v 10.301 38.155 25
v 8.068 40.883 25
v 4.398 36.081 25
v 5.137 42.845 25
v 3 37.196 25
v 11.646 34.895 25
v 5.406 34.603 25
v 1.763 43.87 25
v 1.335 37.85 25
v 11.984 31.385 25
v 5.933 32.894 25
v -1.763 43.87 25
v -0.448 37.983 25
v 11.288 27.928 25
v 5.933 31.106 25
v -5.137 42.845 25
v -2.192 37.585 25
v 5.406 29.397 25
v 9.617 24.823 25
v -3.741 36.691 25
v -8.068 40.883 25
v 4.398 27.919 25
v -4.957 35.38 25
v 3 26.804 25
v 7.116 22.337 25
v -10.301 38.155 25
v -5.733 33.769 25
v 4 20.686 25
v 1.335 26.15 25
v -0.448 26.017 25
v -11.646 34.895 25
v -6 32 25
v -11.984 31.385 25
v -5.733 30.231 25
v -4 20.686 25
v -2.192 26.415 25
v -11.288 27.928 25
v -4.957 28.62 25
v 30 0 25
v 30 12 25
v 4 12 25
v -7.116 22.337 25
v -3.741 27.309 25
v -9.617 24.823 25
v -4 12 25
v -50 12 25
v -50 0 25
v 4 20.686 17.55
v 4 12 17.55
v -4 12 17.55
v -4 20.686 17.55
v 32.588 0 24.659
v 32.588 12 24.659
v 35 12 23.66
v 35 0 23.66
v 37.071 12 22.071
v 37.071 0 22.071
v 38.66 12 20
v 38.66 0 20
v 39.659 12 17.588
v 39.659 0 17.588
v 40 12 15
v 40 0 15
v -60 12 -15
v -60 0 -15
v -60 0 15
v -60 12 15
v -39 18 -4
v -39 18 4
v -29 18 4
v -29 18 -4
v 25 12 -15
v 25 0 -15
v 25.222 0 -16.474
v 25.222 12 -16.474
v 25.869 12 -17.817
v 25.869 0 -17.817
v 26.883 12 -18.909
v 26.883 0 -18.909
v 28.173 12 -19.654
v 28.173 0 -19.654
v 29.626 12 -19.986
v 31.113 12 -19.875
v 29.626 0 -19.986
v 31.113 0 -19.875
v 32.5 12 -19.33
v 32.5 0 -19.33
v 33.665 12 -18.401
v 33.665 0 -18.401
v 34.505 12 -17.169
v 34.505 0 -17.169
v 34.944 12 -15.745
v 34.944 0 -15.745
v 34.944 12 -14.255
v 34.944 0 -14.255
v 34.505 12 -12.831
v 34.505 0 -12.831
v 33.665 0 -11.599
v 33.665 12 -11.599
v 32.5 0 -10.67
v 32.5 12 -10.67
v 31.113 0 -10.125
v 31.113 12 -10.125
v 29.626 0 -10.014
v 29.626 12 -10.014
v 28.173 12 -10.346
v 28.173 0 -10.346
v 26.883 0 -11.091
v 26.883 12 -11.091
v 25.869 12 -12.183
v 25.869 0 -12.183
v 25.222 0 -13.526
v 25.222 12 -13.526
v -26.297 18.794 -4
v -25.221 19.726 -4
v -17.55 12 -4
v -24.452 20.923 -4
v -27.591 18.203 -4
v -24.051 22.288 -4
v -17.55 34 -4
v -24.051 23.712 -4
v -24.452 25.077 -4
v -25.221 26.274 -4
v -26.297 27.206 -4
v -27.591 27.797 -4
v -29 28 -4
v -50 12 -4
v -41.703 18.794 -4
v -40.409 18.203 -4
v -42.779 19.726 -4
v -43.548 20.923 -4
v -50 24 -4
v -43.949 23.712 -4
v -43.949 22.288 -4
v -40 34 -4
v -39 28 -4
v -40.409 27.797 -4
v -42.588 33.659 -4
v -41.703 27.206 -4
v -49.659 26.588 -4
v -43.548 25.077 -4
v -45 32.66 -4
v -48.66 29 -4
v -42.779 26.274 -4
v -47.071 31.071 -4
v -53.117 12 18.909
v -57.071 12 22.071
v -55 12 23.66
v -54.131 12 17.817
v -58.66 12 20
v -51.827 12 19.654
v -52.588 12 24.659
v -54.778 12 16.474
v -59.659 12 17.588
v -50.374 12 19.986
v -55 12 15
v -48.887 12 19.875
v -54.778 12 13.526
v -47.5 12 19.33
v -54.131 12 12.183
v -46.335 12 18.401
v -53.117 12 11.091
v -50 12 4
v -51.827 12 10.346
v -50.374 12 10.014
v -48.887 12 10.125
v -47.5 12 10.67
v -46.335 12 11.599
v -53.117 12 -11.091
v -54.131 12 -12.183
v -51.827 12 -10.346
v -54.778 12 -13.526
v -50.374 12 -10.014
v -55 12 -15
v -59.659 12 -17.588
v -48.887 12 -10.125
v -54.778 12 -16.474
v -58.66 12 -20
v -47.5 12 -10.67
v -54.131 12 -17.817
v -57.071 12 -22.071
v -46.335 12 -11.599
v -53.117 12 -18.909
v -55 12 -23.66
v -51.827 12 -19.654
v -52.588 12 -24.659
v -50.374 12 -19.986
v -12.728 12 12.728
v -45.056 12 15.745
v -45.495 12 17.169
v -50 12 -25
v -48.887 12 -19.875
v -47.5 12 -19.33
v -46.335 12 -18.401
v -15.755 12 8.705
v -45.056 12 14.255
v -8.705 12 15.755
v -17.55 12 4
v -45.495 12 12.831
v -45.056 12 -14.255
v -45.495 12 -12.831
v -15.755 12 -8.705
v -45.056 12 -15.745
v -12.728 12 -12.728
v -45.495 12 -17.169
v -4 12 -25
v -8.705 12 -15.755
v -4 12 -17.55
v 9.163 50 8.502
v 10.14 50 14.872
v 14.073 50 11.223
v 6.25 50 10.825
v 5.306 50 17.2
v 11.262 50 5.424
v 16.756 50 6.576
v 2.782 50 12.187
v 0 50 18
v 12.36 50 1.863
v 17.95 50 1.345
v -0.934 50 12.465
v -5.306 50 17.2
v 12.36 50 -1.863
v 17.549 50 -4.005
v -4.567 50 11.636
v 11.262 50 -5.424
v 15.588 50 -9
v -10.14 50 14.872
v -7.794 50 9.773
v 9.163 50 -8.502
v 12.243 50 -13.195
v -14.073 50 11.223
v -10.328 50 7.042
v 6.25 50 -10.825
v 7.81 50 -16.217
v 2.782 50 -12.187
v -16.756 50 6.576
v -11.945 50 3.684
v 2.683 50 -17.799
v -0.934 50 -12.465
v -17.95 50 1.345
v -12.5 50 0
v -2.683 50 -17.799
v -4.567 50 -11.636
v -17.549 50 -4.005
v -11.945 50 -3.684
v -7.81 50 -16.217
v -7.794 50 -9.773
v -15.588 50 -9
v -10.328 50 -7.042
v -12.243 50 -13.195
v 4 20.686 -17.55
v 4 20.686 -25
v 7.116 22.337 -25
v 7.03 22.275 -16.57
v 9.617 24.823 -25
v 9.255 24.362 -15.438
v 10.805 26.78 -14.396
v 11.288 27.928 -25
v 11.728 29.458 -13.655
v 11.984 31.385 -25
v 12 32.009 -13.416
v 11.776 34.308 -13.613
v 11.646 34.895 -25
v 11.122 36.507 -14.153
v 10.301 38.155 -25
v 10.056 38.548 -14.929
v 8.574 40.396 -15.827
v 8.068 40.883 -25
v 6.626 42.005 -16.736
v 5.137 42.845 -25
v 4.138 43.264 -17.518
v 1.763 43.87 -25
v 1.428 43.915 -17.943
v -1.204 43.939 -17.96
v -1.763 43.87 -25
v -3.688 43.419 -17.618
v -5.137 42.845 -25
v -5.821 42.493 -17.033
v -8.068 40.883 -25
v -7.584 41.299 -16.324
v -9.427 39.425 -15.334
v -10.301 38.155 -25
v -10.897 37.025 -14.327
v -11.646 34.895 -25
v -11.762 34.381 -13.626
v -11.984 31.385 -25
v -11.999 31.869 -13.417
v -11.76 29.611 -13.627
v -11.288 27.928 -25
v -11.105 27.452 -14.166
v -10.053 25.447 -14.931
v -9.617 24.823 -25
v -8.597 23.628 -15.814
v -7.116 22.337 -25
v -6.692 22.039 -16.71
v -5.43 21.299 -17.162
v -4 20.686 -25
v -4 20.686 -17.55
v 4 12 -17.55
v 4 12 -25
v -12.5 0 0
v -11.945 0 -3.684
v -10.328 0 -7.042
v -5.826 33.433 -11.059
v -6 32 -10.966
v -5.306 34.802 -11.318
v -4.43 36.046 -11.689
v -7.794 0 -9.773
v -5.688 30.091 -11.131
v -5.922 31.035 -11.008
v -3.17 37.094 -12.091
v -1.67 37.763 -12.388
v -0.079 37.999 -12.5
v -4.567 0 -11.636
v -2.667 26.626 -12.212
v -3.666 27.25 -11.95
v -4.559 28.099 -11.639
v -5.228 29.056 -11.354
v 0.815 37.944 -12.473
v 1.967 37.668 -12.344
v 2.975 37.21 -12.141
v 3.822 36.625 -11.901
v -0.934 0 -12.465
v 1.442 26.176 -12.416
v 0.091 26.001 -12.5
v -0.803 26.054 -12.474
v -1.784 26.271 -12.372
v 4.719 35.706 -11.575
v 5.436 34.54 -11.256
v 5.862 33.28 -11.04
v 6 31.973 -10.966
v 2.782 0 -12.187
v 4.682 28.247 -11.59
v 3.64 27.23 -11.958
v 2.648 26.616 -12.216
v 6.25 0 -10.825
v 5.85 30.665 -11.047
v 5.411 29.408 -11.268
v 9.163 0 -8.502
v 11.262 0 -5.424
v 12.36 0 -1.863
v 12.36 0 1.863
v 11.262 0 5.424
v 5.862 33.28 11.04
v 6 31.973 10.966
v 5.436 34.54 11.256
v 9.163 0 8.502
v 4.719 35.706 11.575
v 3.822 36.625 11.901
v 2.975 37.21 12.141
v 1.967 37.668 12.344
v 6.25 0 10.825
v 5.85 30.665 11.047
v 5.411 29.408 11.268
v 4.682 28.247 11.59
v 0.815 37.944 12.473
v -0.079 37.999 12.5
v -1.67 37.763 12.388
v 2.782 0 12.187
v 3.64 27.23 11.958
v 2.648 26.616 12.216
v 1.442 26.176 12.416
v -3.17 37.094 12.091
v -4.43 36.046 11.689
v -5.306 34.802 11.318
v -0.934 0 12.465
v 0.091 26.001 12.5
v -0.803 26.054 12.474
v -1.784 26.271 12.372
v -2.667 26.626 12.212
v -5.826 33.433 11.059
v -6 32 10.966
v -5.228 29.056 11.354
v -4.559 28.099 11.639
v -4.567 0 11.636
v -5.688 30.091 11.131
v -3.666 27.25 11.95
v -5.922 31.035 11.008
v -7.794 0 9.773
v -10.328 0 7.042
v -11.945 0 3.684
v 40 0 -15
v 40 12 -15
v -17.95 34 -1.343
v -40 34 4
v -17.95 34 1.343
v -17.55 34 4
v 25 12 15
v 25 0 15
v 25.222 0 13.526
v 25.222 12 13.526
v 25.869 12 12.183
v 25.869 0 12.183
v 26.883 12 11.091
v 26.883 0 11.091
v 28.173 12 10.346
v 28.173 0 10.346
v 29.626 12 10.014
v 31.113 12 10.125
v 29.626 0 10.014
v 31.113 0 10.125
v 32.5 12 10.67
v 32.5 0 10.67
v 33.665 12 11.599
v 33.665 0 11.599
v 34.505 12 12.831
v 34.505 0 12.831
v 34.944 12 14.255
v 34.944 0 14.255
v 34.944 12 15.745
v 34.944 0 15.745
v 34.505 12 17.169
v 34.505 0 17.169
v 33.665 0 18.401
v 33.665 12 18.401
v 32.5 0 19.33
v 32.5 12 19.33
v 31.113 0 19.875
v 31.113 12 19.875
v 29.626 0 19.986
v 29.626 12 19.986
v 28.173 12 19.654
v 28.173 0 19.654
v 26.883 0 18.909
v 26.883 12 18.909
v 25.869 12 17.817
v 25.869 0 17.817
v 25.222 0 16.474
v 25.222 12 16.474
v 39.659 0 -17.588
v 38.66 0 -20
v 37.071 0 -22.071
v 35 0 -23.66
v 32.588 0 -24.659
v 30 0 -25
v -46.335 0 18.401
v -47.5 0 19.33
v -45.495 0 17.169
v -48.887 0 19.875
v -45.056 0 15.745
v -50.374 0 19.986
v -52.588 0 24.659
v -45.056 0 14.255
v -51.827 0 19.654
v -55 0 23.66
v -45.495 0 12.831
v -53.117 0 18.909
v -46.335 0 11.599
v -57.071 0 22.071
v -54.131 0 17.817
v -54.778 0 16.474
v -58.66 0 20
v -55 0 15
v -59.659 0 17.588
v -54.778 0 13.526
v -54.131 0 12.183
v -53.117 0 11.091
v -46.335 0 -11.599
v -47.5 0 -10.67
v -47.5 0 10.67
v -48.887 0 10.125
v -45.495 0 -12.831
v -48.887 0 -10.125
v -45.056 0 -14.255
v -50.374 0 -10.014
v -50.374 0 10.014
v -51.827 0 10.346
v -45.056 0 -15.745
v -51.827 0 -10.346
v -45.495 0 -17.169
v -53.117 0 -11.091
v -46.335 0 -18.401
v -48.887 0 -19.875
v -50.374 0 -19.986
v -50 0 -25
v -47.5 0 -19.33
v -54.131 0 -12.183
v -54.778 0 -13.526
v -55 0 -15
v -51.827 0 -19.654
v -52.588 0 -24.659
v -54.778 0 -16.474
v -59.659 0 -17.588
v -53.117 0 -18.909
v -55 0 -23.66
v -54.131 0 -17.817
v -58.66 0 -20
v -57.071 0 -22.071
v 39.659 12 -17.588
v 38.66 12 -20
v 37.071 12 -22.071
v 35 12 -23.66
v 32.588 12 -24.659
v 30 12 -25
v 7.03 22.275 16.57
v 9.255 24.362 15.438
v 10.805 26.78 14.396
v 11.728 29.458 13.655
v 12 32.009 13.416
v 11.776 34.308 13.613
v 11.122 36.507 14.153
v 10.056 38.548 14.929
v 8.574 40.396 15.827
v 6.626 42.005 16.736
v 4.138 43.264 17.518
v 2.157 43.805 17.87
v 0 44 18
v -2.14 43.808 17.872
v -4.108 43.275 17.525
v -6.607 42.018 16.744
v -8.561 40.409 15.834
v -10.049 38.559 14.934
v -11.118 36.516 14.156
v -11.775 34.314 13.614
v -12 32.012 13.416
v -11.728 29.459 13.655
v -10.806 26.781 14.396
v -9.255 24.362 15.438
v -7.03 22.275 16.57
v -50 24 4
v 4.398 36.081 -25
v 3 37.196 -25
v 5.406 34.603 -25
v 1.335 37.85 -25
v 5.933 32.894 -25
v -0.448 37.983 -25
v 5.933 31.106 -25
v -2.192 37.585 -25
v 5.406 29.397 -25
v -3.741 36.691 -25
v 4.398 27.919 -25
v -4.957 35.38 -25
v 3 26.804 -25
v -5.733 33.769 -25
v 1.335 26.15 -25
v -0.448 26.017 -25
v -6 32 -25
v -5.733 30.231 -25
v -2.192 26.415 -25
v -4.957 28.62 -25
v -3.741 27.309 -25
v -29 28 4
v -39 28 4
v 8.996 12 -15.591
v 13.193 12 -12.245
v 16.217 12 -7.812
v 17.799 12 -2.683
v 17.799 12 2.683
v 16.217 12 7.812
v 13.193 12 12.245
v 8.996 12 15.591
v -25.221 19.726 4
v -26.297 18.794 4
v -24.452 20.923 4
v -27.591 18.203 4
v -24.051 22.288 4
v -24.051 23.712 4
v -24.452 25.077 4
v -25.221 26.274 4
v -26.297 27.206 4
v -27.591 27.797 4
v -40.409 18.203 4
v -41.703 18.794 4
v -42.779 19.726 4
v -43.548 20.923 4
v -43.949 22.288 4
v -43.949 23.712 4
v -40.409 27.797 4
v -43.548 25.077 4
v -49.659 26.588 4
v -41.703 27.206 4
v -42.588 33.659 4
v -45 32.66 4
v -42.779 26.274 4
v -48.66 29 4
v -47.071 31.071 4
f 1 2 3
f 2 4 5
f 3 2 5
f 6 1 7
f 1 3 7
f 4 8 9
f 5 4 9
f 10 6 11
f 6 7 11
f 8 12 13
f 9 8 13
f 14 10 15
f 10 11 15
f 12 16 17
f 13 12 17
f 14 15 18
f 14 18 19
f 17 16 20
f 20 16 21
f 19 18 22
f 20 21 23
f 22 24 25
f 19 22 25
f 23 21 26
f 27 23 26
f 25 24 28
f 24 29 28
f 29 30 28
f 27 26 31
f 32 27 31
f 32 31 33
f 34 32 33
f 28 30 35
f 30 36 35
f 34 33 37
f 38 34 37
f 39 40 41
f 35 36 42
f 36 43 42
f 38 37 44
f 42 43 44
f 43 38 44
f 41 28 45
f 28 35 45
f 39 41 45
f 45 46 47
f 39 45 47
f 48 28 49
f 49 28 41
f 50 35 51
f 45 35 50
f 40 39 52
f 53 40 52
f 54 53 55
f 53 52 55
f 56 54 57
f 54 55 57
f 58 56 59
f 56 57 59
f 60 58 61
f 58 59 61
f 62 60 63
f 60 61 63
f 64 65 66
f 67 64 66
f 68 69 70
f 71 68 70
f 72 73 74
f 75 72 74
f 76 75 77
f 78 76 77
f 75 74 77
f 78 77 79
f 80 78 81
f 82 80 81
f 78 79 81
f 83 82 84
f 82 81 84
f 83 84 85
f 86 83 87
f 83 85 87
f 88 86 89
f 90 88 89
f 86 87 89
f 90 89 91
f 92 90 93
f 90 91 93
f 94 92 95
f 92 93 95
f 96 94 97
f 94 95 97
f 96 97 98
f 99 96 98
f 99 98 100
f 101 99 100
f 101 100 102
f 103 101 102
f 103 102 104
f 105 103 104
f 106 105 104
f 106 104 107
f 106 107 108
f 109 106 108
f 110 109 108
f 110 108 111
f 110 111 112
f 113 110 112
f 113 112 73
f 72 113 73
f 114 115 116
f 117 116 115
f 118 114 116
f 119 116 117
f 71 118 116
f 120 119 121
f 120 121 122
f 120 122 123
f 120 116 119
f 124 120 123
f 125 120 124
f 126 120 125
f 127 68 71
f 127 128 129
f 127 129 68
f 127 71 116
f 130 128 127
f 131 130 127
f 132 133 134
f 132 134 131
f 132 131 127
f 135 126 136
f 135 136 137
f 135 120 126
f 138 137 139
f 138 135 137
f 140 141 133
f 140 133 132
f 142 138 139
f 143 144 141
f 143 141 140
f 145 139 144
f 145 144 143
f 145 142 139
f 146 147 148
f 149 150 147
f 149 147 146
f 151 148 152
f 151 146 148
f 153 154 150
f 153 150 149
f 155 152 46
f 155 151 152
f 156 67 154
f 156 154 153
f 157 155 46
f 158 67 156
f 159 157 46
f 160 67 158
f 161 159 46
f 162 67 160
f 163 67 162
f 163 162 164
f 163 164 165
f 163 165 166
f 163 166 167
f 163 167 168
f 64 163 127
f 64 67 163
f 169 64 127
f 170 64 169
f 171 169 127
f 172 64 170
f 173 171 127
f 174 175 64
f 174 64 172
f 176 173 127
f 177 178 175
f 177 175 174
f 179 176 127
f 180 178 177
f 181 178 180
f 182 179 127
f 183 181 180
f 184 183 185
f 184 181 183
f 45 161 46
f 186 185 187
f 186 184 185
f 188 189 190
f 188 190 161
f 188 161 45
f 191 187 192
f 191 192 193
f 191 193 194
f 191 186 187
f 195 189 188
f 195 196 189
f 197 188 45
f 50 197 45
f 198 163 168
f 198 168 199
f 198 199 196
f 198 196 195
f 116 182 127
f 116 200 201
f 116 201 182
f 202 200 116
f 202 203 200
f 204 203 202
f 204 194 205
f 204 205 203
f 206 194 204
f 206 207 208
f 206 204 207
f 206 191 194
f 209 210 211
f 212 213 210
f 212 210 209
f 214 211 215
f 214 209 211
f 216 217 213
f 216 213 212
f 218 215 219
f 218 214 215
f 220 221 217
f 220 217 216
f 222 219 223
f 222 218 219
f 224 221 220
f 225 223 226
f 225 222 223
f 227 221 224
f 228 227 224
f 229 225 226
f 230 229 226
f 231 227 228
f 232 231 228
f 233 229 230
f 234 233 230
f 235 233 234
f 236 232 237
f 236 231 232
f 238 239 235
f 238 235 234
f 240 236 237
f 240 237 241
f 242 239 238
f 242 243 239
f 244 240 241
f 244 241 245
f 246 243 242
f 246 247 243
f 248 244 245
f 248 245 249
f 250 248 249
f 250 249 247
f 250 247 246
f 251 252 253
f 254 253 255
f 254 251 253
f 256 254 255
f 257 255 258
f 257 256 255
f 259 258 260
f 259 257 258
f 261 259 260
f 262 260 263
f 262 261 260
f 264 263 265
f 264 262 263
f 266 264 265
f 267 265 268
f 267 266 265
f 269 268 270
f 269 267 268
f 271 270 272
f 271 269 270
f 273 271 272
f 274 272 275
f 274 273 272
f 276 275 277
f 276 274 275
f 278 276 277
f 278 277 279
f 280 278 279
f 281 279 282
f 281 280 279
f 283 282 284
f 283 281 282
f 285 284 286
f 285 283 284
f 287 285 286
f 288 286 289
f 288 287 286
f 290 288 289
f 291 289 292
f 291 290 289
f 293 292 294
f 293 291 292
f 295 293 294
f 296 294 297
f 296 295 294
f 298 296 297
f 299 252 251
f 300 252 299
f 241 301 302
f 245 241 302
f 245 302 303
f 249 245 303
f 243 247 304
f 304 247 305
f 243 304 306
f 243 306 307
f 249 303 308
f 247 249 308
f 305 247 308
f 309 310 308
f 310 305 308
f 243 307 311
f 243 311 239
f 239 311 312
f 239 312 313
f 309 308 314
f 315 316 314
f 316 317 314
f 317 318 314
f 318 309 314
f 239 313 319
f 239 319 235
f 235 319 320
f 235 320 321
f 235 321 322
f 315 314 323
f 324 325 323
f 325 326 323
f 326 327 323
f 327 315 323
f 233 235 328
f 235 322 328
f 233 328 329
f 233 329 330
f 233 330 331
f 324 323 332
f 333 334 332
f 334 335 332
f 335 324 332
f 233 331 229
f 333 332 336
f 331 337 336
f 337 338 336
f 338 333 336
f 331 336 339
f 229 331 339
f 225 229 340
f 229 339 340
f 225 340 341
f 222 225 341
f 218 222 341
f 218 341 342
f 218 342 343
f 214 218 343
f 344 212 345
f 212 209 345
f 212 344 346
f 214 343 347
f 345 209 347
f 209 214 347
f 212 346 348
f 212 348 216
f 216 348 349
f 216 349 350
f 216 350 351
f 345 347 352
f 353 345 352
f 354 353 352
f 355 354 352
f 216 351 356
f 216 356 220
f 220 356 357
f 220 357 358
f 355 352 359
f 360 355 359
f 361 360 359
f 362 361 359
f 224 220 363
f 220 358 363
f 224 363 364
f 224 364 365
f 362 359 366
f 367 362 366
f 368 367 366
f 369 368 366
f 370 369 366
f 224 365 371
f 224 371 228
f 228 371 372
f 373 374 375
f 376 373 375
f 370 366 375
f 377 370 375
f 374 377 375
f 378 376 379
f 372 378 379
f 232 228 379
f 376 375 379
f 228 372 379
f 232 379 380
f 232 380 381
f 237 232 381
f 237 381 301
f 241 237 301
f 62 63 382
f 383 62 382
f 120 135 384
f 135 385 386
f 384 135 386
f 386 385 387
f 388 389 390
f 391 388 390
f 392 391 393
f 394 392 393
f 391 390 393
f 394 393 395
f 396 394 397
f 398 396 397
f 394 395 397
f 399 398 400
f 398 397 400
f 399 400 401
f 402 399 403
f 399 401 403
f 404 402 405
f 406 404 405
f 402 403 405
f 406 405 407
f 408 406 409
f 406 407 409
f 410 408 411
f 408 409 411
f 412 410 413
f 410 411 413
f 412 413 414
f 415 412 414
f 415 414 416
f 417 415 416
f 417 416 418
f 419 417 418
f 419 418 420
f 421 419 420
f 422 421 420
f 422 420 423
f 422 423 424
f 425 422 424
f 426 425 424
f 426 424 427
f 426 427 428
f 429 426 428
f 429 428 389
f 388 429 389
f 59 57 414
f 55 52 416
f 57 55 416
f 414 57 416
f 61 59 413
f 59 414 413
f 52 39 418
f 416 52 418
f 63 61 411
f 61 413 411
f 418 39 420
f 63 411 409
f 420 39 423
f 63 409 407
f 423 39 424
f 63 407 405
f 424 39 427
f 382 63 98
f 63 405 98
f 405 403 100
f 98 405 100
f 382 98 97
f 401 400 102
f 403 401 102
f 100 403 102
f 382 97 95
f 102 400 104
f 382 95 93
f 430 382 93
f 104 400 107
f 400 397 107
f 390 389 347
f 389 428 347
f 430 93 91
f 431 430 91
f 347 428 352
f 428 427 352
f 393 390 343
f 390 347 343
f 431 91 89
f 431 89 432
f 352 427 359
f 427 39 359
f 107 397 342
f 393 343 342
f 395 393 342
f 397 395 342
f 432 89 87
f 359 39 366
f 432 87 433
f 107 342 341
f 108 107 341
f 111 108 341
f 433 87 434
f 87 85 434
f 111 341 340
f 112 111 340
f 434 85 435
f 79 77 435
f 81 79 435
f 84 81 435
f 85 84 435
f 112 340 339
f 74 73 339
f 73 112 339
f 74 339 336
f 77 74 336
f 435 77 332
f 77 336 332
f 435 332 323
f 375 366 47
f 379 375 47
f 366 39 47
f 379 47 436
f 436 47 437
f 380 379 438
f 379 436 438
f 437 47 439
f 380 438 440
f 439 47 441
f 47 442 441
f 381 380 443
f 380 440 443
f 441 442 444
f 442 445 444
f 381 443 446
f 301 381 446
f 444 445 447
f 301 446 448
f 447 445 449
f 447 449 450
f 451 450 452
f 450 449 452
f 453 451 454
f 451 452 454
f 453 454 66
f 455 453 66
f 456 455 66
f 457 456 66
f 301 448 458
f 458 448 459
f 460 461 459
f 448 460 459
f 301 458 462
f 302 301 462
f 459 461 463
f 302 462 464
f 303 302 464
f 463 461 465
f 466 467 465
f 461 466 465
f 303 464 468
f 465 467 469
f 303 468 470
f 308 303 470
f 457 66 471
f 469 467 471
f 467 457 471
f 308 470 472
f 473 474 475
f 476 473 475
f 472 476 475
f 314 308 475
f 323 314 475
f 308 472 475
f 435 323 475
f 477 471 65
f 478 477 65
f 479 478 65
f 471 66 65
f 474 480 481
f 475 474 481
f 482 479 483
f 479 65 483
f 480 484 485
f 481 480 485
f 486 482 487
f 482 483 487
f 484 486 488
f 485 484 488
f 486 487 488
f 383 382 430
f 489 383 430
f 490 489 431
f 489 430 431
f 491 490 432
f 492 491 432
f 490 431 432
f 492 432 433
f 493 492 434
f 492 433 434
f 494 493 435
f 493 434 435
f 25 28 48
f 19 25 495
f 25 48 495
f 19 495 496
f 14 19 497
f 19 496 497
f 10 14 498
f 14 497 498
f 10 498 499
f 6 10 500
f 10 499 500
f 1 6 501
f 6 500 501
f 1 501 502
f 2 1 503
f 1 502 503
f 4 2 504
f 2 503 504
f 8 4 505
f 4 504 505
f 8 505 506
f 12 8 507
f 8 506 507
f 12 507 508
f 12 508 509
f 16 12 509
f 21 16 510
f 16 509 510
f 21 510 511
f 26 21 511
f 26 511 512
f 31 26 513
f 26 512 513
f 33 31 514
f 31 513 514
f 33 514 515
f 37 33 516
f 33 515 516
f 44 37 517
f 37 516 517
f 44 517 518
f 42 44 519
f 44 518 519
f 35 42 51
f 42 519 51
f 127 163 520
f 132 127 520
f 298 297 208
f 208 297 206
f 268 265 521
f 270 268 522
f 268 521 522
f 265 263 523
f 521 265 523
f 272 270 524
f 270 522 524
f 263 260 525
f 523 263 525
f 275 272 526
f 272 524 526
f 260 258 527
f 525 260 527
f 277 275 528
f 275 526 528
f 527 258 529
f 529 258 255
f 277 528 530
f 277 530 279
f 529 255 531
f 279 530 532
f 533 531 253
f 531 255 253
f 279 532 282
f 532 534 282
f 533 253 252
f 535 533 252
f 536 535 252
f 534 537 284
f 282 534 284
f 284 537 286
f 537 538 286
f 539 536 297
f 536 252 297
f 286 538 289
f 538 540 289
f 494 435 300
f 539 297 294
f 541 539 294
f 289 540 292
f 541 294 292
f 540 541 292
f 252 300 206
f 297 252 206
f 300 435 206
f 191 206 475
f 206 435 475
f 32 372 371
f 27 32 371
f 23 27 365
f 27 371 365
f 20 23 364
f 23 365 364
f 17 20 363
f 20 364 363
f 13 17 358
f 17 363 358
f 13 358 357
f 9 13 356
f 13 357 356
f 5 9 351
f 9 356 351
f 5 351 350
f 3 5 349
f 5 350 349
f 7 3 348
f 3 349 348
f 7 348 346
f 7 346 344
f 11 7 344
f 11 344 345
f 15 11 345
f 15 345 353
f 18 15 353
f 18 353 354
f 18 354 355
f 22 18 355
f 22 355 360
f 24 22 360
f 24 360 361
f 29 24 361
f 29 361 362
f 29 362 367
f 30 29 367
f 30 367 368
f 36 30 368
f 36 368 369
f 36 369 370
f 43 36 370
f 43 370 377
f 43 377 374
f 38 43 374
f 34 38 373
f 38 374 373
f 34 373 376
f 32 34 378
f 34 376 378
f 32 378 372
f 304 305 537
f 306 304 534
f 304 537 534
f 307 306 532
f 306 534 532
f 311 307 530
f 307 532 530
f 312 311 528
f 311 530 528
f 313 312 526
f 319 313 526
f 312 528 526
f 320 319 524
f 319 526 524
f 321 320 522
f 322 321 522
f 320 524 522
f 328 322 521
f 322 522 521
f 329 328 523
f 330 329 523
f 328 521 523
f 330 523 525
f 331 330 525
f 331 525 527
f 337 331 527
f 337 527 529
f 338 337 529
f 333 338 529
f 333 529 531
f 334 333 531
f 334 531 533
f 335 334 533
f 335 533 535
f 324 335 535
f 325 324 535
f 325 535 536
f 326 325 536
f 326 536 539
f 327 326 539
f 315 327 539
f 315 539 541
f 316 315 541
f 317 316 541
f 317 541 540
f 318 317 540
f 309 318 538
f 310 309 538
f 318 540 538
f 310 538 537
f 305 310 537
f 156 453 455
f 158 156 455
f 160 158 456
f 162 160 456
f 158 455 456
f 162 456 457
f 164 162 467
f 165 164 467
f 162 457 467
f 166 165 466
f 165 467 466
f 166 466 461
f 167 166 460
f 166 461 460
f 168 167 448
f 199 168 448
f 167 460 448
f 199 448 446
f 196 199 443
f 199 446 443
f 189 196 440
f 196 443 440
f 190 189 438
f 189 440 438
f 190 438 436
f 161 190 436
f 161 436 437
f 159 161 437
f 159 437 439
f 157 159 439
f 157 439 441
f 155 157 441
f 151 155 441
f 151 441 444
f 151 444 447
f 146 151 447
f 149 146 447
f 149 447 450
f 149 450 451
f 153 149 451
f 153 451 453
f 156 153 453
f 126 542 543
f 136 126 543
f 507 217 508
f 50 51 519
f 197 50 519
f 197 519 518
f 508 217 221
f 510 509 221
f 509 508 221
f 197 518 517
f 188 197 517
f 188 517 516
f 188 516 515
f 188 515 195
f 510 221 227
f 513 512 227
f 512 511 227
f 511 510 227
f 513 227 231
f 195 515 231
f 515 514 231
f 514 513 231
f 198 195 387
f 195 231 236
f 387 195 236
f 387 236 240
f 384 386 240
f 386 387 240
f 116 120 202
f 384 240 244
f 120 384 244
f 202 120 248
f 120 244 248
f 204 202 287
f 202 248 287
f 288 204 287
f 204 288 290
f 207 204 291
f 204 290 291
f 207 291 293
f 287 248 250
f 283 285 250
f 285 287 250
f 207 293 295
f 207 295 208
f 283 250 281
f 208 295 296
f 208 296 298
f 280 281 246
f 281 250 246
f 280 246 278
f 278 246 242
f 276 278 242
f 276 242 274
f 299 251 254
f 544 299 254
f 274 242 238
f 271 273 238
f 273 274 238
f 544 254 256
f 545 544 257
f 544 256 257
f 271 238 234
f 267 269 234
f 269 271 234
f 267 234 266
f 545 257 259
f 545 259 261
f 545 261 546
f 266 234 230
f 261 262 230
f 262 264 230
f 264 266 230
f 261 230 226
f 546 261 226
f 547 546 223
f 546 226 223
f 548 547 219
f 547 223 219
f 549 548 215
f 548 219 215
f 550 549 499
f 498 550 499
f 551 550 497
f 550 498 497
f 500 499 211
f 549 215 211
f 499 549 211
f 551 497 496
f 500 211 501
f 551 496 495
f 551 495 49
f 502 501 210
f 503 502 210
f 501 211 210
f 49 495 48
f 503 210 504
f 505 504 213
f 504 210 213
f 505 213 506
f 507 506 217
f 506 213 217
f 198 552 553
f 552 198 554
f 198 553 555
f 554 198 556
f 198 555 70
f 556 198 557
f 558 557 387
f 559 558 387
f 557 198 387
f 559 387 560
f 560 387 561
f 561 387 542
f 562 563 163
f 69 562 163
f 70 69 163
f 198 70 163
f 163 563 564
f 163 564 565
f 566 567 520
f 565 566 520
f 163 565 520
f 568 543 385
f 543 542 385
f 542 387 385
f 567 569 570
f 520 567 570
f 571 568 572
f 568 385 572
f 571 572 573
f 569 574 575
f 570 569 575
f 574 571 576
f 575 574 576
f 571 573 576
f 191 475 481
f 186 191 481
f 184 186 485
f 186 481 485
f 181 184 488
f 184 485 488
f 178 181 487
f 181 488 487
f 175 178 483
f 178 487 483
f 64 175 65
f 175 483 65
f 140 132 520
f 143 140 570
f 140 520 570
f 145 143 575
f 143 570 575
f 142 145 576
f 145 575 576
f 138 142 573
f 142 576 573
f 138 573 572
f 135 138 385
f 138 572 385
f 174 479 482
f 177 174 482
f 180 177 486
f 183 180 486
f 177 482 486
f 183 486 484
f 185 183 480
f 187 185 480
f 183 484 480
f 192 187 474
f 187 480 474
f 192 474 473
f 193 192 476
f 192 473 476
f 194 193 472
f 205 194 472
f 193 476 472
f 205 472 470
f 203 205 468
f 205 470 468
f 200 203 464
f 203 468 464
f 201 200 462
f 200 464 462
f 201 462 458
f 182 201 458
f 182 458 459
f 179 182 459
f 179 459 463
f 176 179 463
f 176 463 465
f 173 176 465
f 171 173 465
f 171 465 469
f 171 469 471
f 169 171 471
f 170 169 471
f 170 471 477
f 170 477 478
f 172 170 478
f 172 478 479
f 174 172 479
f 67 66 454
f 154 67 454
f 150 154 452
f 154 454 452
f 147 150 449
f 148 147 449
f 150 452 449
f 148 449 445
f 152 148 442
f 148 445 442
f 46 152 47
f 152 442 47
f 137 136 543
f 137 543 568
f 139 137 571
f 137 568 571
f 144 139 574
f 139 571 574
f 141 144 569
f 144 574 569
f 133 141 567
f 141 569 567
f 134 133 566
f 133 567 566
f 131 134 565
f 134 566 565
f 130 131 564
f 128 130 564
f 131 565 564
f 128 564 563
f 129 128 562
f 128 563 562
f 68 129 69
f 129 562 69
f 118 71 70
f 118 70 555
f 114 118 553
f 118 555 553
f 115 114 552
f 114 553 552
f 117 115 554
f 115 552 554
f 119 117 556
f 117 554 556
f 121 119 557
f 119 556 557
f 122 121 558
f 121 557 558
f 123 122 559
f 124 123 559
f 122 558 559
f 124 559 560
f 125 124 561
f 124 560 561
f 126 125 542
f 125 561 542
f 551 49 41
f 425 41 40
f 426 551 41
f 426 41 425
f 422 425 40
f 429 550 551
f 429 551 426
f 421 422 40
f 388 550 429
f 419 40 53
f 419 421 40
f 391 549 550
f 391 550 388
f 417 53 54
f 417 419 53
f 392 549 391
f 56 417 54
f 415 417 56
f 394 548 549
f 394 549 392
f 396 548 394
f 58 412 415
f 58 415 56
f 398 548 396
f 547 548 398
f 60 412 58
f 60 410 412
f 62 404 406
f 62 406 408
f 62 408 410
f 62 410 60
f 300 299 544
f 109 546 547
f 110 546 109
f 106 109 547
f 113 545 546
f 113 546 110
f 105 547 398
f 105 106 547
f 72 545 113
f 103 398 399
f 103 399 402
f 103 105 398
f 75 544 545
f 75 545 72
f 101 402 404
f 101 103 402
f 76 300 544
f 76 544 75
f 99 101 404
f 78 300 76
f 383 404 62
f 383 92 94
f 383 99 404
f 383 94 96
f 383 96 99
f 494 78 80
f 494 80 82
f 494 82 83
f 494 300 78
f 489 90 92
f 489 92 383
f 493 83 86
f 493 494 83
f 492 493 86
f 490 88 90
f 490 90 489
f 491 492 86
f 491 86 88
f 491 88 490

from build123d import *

# Parameters (mm, degrees)
EXTRUDE_1_DEPTH             = 12
SKETCH_2_W                  = 18
SKETCH_2_H                  = 50
EXTRUDE_3_REACH             = 84.006
SKETCH_3_R                  = 12
EXTRUDE_3_DIRECTION_2_REACH = 84.006
EXTRUDE_4_DEPTH             = 4
RIB_1_REACH                 = 84.006
SKETCH_5_WALL_W             = 174.012194852
SKETCH_5_WALL_H             = 8
HOLE_WIZARD_10_0_10_1_D     = 10
PATTERN_LINEAR_2_COUNT      = 2
PATTERN_LINEAR_2_PITCH      = 80
PATTERN_LINEAR_2_COUNT_DIR2 = 2
PATTERN_LINEAR_2_PITCH_DIR2 = 30
CUT_EXTRUDE_1_DEPTH         = 84.312664198
HOLE_WIZARD_25_0_25_1_D     = 25
HOLE_WIZARD_12_0_12_1_D     = 12


with BuildPart() as part:
    # 草图1 → 凸台-拉伸1 (new body)
    with BuildSketch(Plane(origin=(0, 0, 0), x_dir=(1, 0, 0), z_dir=(0, 1, 0))):
        with BuildLine():
            Line((-50, -25), (30, -25))
            ThreePointArc((30, -25), (37.071067812, -22.071067812), (40, -15))
            Line((40, -15), (40, 15))
            ThreePointArc((40, 15), (37.071067812, 22.071067812), (30, 25))
            Line((30, 25), (-50, 25))
            ThreePointArc((-50, 25), (-57.071067812, 22.071067812), (-60, 15))
            Line((-60, 15), (-60, -15))
            ThreePointArc((-60, -15), (-57.071067812, -22.071067812), (-50, -25))
        make_face()
    extrude(amount=EXTRUDE_1_DEPTH)

    # 草图2 → 旋转1 (revolve)
    with BuildSketch(Plane.XY, mode=Mode.PRIVATE) as revolve_1_sk:
        with Locations((9, 25)):
            Rectangle(SKETCH_2_W, SKETCH_2_H)
    revolve(revolve_1_sk.sketch.rotate(Axis((0, 42.98545342, 0), (0, -1, 0)), 90), axis=Axis((0, 42.98545342, 0), (0, -1, 0)))

    # 凸台-拉伸3: up to this face of the body (flat: up to its plane)
    extrude_3_end = Plane(part.part.faces().sort_by_distance((-10, 6, 25))[0])
    # 草图3 → 凸台-拉伸3 (add, up to the picked face)
    with BuildSketch(Plane.XY, mode=Mode.PRIVATE) as extrude_3_sk1:
        with Locations(Location((0, 32, 0), (0, 0, 180))):
            Circle(SKETCH_3_R)
    extrude_3_tool1 = split(extrude(extrude_3_sk1.sketch, amount=EXTRUDE_3_REACH, mode=Mode.PRIVATE), bisect_by=extrude_3_end, keep=Keep.BOTH, mode=Mode.PRIVATE)
    add(extrude_3_tool1.solids().sort_by(Axis((0, 32, 0), (0, 0, 1)))[0])

    # 凸台-拉伸3 direction 2: up to this face of the body (flat: up to its plane)
    extrude_3_direction_2_end = Plane(part.part.faces().sort_by_distance((-10, 6, -25))[0])
    # 草图3 → 凸台-拉伸3 direction 2 (add, up to the picked face)
    with BuildSketch(Plane.XY, mode=Mode.PRIVATE) as extrude_3_direction_2_sk1:
        with Locations(Location((0, 32, 0), (0, 0, 180))):
            Circle(SKETCH_3_R)
    extrude_3_direction_2_tool1 = split(extrude(extrude_3_direction_2_sk1.sketch, amount=-EXTRUDE_3_DIRECTION_2_REACH, mode=Mode.PRIVATE), bisect_by=extrude_3_direction_2_end, keep=Keep.BOTH, mode=Mode.PRIVATE)
    add(extrude_3_direction_2_tool1.solids().sort_by(Axis((0, 32, 0), (0, 0, -1)))[0])

    # 草图4 → 凸台-拉伸4 (add, symmetric)
    with BuildSketch(Plane.XY):
        with BuildLine():
            Line((-40, 34), (0, 34))
            Line((0, 34), (0, 12))
            Line((0, 12), (-50, 12))
            Line((-50, 12), (-50, 24))
            ThreePointArc((-50, 24), (-47.071067812, 31.071067812), (-40, 34))
        make_face()
    extrude(amount=EXTRUDE_4_DEPTH, both=True)

    # 草图5 wall → 筋1 (add, up to next)
    with BuildSketch(Plane(origin=(0, 16, 25), x_dir=(0, -1, 0), z_dir=(0, 0, -1)), mode=Mode.PRIVATE) as rib_1_sk1:
        Rectangle(SKETCH_5_WALL_W, SKETCH_5_WALL_H)
    rib_1_tool1 = extrude(rib_1_sk1.sketch, amount=RIB_1_REACH, mode=Mode.PRIVATE) - part.part
    rib_1 = rib_1_tool1.solids().sort_by_distance((0, 16, 25))[0]
    add(rib_1)

    # 镜向1: 筋1 across plane
    add(rib_1.mirror(Plane.XY))

    # Ø10.0 (10) 直径孔1 (through all)
    with Locations(Plane(origin=(0, 12, 0), x_dir=(1, 0, 0), z_dir=(0, 1, 0))):
        with Locations((-50, -15)):
            hole_wizard_10_0_10_1 = Hole(HOLE_WIZARD_10_0_10_1_D / 2)

    # 阵列(线性)2: Hole Wizard 10.0 _10_ _1 2 × 2
    with Locations(*[(i * PATTERN_LINEAR_2_PITCH, 0, -j * PATTERN_LINEAR_2_PITCH_DIR2) for i in range(PATTERN_LINEAR_2_COUNT) for j in range(PATTERN_LINEAR_2_COUNT_DIR2) if (i, j) != (0, 0)]):
        add(hole_wizard_10_0_10_1, mode=Mode.SUBTRACT)

    # 草图8 → 切除-拉伸1 (cut, through all)
    with BuildSketch(Plane.XY.offset(4)):
        with BuildLine():
            Line((-39, 18), (-29, 18))
            ThreePointArc((-29, 18), (-24, 23), (-29, 28))
            Line((-29, 28), (-39, 28))
            ThreePointArc((-39, 28), (-44, 23), (-39, 18))
        make_face()
    extrude(amount=-CUT_EXTRUDE_1_DEPTH, mode=Mode.SUBTRACT)

    # Ø25.0 (25) 直径孔1 (through all)
    with Locations(Plane(origin=(0, 50, 0), x_dir=(1, 0, 0), z_dir=(0, 1, 0))):
        with Locations((0, 0)):
            Hole(HOLE_WIZARD_25_0_25_1_D / 2)

    # Ø12.0 (12) 直径孔1 (through all)
    with Locations(Plane.XY.offset(25)):
        with Locations((0, 32)):
            Hole(HOLE_WIZARD_12_0_12_1_D / 2)


solid = part.part
